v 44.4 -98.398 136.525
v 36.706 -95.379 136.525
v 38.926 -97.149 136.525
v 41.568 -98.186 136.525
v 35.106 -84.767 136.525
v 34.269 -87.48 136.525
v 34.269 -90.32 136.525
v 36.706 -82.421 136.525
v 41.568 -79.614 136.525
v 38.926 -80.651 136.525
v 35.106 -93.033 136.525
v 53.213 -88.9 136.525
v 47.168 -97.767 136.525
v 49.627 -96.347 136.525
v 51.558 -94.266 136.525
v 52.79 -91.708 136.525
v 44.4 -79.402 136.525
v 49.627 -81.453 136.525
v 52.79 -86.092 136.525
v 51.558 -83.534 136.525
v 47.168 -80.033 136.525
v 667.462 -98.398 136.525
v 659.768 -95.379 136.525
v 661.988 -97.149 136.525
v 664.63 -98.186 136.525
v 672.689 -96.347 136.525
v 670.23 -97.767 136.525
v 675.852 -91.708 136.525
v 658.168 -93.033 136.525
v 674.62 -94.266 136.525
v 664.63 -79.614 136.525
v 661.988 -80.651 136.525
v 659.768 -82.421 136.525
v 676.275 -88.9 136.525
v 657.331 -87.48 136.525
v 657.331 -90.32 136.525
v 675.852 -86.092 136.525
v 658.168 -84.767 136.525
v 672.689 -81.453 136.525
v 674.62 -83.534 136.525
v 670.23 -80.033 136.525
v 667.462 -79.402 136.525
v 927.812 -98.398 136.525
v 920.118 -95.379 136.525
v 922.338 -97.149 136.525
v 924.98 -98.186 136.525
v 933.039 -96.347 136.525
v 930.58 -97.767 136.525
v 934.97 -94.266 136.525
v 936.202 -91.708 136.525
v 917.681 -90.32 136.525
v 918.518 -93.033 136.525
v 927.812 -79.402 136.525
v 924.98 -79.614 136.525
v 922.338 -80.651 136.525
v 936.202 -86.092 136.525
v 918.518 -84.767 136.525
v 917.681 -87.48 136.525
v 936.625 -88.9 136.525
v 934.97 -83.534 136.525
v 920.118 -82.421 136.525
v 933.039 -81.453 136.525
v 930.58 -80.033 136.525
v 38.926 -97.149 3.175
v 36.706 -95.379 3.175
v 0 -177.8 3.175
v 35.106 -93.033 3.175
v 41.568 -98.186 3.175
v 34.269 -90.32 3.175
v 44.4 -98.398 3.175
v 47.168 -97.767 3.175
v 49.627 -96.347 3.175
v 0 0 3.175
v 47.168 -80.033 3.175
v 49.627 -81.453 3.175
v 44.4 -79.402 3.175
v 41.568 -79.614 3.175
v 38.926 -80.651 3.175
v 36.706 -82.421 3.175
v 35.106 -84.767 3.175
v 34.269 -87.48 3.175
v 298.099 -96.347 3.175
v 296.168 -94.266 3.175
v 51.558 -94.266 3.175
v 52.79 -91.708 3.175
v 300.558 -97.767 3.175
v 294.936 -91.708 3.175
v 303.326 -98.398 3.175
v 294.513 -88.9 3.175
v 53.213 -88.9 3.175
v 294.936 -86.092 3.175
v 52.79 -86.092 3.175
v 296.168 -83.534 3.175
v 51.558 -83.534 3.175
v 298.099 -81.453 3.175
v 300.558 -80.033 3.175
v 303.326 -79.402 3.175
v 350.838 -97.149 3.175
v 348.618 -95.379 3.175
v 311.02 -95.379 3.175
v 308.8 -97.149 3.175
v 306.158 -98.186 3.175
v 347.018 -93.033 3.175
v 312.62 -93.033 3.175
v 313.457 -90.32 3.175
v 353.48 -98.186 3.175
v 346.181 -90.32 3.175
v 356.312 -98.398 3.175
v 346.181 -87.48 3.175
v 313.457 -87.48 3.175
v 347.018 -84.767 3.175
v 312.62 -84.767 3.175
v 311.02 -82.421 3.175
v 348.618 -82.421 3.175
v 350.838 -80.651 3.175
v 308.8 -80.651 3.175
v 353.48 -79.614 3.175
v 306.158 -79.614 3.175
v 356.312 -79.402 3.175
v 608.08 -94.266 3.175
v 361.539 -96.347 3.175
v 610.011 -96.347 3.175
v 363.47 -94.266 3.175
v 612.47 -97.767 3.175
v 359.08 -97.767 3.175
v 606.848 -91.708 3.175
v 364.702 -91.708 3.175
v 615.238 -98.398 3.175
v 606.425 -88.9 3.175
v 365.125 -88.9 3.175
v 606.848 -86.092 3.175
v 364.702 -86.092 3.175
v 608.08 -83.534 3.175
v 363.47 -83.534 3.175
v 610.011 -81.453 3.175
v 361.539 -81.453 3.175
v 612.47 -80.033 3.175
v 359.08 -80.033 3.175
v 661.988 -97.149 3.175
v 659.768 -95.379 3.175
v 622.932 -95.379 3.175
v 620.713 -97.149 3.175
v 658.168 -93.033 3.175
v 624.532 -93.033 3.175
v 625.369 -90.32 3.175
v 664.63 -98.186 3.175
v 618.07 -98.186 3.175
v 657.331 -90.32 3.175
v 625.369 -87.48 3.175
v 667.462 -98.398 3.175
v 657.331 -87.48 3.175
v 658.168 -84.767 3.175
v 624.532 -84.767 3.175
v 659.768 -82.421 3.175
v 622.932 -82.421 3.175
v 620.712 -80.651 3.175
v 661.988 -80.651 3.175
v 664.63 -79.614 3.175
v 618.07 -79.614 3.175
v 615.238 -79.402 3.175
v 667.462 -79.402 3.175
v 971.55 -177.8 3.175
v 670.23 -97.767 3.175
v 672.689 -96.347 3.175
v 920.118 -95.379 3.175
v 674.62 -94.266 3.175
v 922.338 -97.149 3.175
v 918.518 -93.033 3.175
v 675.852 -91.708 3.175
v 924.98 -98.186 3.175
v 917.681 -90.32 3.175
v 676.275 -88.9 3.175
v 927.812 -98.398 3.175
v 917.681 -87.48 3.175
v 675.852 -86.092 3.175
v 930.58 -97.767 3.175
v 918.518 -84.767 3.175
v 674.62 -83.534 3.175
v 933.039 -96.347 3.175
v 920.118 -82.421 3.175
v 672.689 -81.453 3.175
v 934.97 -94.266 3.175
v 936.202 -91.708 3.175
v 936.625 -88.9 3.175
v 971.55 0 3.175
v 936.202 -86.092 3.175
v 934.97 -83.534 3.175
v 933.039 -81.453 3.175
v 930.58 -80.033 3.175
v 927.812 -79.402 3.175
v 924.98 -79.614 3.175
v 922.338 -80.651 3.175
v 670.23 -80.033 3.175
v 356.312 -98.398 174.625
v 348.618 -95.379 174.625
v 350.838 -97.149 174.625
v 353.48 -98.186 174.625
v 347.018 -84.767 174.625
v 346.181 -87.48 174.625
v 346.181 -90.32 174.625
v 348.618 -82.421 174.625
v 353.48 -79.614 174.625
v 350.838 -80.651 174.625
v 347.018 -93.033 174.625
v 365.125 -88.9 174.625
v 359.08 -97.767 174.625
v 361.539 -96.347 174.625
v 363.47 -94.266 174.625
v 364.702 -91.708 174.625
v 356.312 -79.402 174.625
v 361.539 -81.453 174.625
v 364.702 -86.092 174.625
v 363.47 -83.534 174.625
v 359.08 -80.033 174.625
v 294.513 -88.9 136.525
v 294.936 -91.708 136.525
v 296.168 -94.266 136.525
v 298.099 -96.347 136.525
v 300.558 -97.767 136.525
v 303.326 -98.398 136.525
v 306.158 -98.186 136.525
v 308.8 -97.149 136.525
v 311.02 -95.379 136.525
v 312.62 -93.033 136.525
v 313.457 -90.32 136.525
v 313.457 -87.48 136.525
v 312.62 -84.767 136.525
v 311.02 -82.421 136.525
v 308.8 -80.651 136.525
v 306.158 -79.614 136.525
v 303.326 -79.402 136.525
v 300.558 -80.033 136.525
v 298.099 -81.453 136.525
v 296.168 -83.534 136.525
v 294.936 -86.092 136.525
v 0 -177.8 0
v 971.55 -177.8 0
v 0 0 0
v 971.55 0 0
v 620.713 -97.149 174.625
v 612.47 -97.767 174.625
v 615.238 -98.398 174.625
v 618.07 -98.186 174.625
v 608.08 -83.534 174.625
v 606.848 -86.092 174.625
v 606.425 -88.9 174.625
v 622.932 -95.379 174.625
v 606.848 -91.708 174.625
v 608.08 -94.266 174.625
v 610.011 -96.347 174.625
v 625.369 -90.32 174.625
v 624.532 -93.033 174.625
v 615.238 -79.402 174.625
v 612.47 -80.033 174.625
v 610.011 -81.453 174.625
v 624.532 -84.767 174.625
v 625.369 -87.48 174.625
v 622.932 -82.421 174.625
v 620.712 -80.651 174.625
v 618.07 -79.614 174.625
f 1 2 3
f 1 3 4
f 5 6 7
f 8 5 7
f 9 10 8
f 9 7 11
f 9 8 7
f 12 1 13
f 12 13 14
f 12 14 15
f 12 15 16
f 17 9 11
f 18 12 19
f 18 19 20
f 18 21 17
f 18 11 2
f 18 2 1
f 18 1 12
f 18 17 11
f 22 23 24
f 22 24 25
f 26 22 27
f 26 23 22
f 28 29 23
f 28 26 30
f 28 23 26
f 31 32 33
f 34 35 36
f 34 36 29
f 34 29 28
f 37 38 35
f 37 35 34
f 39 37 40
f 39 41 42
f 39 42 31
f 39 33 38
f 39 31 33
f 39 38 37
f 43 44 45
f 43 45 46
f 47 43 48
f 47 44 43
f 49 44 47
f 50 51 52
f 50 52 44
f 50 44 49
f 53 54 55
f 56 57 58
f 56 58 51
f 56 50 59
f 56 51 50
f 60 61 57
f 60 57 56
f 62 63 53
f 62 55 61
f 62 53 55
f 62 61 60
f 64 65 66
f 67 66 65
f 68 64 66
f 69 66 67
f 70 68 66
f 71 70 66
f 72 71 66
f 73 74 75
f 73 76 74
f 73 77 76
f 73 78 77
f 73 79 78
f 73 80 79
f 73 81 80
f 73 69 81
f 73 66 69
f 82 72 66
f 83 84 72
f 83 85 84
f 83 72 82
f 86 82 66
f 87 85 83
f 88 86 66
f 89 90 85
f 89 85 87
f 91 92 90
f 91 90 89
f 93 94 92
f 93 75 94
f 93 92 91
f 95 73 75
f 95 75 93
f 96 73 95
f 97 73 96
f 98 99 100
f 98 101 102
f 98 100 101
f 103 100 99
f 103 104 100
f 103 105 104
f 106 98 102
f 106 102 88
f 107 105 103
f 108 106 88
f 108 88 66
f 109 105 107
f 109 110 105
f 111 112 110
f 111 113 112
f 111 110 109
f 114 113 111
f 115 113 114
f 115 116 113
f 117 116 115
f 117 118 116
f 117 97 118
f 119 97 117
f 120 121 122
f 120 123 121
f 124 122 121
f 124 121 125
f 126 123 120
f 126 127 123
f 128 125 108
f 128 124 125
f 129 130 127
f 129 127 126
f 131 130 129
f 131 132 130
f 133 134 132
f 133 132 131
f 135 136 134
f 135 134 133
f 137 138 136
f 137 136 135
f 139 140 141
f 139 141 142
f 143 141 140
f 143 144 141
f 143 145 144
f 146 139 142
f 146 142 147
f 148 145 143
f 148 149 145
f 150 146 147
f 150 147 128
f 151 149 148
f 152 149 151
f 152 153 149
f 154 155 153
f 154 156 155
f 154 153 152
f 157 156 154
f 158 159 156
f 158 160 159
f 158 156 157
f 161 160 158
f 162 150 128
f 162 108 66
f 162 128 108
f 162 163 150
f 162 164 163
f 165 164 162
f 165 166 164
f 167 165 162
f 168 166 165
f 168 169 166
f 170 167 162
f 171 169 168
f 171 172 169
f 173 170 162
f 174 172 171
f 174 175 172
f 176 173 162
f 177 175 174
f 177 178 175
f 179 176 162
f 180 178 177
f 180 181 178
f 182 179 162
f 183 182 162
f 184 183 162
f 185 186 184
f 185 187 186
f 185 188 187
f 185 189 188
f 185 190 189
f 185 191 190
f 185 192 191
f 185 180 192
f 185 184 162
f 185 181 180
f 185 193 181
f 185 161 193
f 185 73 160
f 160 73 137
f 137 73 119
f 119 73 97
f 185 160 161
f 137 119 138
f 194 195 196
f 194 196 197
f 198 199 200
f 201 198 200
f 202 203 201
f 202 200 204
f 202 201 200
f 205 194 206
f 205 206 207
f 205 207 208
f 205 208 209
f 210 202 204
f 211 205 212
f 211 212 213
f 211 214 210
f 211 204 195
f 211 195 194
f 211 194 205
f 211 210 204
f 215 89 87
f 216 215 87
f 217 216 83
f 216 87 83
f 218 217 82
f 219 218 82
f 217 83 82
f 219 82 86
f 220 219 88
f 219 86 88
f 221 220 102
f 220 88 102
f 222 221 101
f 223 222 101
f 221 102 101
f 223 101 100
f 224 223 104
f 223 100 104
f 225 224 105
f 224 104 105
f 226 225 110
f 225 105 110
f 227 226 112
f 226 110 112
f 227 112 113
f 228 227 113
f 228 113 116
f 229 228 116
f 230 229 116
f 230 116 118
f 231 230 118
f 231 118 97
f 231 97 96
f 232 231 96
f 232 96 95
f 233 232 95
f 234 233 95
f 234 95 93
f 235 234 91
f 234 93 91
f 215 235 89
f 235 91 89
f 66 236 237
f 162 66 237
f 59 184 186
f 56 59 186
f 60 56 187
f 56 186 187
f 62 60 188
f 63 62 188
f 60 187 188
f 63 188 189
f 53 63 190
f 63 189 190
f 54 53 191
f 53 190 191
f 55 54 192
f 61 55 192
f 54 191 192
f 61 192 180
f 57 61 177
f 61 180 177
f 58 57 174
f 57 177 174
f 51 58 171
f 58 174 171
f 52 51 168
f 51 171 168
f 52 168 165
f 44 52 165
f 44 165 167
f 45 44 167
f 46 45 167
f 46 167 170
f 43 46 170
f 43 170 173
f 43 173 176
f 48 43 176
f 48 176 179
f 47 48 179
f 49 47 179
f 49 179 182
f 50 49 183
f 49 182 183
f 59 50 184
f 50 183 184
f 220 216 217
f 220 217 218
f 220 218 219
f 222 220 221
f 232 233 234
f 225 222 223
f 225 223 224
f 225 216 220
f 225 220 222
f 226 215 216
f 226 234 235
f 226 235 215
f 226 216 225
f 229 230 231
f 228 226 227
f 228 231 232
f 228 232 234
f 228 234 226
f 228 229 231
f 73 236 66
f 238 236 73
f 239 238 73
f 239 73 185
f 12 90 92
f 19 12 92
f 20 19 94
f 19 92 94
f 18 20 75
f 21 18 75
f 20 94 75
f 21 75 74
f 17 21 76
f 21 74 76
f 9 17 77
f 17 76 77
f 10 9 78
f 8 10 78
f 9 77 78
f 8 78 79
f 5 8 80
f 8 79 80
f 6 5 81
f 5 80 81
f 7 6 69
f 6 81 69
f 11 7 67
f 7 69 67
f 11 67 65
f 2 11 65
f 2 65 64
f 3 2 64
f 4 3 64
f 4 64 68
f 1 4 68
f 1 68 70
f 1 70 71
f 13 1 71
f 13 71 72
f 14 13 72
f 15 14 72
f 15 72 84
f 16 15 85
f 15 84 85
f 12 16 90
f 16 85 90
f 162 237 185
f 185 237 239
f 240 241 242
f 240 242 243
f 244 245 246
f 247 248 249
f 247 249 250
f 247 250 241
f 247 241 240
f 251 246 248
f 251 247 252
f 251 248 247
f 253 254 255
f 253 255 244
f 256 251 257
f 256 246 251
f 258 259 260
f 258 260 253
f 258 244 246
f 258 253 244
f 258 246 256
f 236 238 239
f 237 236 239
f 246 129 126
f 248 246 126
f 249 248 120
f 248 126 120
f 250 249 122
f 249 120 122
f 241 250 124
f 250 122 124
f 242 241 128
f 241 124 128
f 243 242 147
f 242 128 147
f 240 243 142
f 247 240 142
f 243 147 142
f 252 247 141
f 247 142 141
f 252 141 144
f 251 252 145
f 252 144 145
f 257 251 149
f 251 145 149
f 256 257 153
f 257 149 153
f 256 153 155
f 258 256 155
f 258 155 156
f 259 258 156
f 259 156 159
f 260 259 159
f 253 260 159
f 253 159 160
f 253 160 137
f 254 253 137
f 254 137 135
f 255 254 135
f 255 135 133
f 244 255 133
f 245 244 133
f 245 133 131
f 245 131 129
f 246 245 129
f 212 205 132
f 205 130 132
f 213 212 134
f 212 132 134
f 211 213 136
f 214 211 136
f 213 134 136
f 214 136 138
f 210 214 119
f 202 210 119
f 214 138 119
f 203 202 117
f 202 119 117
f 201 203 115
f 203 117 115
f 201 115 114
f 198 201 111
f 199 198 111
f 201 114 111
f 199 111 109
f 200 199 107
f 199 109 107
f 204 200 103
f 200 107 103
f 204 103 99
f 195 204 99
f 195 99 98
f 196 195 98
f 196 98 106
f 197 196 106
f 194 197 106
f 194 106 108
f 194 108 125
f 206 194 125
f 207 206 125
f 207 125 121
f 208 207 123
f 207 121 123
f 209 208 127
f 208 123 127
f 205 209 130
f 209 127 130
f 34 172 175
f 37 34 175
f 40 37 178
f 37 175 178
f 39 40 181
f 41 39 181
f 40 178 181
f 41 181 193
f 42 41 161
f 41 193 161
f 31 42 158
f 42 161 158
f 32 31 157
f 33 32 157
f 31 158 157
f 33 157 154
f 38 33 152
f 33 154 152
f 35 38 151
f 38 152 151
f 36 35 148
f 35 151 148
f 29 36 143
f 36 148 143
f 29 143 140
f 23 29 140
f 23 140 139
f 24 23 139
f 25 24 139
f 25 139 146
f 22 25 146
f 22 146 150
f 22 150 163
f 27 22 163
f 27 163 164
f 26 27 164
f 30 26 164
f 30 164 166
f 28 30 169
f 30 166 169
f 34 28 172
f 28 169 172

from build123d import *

# Parameters (mm, degrees)
F0_W     = 971.55
F0_H     = 177.8
F1_DEPTH = 3.175
F2_R     = 9.525
F3_DEPTH = 133.35
F4_DEPTH = 38.1


with BuildPart() as f1:
    # F0 (on Top) → F1 (new body)
    with BuildSketch(Plane.XY):
        with Locations((485.775, -88.9)):
            Rectangle(F0_W, F0_H)
    extrude(amount=F1_DEPTH)

    # F2 (on face) → F3 (join)
    with BuildSketch(Plane.XY.offset(3.175)):
        with Locations((43.688, -88.9)):
            Circle(F2_R)
        with BuildLine():
            ThreePointArc((313.563, -88.9), (304.038, -79.375), (294.513, -88.9))
            ThreePointArc((294.513, -88.9), (304.038, -98.425), (313.563, -88.9))
        make_face()
        with Locations((355.6, -88.9)):
            Circle(F2_R)
        with BuildLine():
            ThreePointArc((625.475, -88.9), (615.95, -79.375), (606.425, -88.9))
            ThreePointArc((606.425, -88.9), (615.95, -98.425), (625.475, -88.9))
        make_face()
        with Locations((666.75, -88.9)):
            Circle(F2_R)
        with BuildLine():
            ThreePointArc((917.575, -88.9), (927.1, -98.425), (936.625, -88.9))
            ThreePointArc((936.625, -88.9), (927.1, -79.375), (917.575, -88.9))
        make_face()
    extrude(amount=F3_DEPTH)

    # F4 (add): faces of the model
    f4_faces = [f1.faces().sort_by_distance(p)[0] for p in [
        (355.6, -88.9, 136.525),
        (615.95, -88.9, 136.525),
    ]]
    extrude(f4_faces, amount=F4_DEPTH)


solid = f1.part
